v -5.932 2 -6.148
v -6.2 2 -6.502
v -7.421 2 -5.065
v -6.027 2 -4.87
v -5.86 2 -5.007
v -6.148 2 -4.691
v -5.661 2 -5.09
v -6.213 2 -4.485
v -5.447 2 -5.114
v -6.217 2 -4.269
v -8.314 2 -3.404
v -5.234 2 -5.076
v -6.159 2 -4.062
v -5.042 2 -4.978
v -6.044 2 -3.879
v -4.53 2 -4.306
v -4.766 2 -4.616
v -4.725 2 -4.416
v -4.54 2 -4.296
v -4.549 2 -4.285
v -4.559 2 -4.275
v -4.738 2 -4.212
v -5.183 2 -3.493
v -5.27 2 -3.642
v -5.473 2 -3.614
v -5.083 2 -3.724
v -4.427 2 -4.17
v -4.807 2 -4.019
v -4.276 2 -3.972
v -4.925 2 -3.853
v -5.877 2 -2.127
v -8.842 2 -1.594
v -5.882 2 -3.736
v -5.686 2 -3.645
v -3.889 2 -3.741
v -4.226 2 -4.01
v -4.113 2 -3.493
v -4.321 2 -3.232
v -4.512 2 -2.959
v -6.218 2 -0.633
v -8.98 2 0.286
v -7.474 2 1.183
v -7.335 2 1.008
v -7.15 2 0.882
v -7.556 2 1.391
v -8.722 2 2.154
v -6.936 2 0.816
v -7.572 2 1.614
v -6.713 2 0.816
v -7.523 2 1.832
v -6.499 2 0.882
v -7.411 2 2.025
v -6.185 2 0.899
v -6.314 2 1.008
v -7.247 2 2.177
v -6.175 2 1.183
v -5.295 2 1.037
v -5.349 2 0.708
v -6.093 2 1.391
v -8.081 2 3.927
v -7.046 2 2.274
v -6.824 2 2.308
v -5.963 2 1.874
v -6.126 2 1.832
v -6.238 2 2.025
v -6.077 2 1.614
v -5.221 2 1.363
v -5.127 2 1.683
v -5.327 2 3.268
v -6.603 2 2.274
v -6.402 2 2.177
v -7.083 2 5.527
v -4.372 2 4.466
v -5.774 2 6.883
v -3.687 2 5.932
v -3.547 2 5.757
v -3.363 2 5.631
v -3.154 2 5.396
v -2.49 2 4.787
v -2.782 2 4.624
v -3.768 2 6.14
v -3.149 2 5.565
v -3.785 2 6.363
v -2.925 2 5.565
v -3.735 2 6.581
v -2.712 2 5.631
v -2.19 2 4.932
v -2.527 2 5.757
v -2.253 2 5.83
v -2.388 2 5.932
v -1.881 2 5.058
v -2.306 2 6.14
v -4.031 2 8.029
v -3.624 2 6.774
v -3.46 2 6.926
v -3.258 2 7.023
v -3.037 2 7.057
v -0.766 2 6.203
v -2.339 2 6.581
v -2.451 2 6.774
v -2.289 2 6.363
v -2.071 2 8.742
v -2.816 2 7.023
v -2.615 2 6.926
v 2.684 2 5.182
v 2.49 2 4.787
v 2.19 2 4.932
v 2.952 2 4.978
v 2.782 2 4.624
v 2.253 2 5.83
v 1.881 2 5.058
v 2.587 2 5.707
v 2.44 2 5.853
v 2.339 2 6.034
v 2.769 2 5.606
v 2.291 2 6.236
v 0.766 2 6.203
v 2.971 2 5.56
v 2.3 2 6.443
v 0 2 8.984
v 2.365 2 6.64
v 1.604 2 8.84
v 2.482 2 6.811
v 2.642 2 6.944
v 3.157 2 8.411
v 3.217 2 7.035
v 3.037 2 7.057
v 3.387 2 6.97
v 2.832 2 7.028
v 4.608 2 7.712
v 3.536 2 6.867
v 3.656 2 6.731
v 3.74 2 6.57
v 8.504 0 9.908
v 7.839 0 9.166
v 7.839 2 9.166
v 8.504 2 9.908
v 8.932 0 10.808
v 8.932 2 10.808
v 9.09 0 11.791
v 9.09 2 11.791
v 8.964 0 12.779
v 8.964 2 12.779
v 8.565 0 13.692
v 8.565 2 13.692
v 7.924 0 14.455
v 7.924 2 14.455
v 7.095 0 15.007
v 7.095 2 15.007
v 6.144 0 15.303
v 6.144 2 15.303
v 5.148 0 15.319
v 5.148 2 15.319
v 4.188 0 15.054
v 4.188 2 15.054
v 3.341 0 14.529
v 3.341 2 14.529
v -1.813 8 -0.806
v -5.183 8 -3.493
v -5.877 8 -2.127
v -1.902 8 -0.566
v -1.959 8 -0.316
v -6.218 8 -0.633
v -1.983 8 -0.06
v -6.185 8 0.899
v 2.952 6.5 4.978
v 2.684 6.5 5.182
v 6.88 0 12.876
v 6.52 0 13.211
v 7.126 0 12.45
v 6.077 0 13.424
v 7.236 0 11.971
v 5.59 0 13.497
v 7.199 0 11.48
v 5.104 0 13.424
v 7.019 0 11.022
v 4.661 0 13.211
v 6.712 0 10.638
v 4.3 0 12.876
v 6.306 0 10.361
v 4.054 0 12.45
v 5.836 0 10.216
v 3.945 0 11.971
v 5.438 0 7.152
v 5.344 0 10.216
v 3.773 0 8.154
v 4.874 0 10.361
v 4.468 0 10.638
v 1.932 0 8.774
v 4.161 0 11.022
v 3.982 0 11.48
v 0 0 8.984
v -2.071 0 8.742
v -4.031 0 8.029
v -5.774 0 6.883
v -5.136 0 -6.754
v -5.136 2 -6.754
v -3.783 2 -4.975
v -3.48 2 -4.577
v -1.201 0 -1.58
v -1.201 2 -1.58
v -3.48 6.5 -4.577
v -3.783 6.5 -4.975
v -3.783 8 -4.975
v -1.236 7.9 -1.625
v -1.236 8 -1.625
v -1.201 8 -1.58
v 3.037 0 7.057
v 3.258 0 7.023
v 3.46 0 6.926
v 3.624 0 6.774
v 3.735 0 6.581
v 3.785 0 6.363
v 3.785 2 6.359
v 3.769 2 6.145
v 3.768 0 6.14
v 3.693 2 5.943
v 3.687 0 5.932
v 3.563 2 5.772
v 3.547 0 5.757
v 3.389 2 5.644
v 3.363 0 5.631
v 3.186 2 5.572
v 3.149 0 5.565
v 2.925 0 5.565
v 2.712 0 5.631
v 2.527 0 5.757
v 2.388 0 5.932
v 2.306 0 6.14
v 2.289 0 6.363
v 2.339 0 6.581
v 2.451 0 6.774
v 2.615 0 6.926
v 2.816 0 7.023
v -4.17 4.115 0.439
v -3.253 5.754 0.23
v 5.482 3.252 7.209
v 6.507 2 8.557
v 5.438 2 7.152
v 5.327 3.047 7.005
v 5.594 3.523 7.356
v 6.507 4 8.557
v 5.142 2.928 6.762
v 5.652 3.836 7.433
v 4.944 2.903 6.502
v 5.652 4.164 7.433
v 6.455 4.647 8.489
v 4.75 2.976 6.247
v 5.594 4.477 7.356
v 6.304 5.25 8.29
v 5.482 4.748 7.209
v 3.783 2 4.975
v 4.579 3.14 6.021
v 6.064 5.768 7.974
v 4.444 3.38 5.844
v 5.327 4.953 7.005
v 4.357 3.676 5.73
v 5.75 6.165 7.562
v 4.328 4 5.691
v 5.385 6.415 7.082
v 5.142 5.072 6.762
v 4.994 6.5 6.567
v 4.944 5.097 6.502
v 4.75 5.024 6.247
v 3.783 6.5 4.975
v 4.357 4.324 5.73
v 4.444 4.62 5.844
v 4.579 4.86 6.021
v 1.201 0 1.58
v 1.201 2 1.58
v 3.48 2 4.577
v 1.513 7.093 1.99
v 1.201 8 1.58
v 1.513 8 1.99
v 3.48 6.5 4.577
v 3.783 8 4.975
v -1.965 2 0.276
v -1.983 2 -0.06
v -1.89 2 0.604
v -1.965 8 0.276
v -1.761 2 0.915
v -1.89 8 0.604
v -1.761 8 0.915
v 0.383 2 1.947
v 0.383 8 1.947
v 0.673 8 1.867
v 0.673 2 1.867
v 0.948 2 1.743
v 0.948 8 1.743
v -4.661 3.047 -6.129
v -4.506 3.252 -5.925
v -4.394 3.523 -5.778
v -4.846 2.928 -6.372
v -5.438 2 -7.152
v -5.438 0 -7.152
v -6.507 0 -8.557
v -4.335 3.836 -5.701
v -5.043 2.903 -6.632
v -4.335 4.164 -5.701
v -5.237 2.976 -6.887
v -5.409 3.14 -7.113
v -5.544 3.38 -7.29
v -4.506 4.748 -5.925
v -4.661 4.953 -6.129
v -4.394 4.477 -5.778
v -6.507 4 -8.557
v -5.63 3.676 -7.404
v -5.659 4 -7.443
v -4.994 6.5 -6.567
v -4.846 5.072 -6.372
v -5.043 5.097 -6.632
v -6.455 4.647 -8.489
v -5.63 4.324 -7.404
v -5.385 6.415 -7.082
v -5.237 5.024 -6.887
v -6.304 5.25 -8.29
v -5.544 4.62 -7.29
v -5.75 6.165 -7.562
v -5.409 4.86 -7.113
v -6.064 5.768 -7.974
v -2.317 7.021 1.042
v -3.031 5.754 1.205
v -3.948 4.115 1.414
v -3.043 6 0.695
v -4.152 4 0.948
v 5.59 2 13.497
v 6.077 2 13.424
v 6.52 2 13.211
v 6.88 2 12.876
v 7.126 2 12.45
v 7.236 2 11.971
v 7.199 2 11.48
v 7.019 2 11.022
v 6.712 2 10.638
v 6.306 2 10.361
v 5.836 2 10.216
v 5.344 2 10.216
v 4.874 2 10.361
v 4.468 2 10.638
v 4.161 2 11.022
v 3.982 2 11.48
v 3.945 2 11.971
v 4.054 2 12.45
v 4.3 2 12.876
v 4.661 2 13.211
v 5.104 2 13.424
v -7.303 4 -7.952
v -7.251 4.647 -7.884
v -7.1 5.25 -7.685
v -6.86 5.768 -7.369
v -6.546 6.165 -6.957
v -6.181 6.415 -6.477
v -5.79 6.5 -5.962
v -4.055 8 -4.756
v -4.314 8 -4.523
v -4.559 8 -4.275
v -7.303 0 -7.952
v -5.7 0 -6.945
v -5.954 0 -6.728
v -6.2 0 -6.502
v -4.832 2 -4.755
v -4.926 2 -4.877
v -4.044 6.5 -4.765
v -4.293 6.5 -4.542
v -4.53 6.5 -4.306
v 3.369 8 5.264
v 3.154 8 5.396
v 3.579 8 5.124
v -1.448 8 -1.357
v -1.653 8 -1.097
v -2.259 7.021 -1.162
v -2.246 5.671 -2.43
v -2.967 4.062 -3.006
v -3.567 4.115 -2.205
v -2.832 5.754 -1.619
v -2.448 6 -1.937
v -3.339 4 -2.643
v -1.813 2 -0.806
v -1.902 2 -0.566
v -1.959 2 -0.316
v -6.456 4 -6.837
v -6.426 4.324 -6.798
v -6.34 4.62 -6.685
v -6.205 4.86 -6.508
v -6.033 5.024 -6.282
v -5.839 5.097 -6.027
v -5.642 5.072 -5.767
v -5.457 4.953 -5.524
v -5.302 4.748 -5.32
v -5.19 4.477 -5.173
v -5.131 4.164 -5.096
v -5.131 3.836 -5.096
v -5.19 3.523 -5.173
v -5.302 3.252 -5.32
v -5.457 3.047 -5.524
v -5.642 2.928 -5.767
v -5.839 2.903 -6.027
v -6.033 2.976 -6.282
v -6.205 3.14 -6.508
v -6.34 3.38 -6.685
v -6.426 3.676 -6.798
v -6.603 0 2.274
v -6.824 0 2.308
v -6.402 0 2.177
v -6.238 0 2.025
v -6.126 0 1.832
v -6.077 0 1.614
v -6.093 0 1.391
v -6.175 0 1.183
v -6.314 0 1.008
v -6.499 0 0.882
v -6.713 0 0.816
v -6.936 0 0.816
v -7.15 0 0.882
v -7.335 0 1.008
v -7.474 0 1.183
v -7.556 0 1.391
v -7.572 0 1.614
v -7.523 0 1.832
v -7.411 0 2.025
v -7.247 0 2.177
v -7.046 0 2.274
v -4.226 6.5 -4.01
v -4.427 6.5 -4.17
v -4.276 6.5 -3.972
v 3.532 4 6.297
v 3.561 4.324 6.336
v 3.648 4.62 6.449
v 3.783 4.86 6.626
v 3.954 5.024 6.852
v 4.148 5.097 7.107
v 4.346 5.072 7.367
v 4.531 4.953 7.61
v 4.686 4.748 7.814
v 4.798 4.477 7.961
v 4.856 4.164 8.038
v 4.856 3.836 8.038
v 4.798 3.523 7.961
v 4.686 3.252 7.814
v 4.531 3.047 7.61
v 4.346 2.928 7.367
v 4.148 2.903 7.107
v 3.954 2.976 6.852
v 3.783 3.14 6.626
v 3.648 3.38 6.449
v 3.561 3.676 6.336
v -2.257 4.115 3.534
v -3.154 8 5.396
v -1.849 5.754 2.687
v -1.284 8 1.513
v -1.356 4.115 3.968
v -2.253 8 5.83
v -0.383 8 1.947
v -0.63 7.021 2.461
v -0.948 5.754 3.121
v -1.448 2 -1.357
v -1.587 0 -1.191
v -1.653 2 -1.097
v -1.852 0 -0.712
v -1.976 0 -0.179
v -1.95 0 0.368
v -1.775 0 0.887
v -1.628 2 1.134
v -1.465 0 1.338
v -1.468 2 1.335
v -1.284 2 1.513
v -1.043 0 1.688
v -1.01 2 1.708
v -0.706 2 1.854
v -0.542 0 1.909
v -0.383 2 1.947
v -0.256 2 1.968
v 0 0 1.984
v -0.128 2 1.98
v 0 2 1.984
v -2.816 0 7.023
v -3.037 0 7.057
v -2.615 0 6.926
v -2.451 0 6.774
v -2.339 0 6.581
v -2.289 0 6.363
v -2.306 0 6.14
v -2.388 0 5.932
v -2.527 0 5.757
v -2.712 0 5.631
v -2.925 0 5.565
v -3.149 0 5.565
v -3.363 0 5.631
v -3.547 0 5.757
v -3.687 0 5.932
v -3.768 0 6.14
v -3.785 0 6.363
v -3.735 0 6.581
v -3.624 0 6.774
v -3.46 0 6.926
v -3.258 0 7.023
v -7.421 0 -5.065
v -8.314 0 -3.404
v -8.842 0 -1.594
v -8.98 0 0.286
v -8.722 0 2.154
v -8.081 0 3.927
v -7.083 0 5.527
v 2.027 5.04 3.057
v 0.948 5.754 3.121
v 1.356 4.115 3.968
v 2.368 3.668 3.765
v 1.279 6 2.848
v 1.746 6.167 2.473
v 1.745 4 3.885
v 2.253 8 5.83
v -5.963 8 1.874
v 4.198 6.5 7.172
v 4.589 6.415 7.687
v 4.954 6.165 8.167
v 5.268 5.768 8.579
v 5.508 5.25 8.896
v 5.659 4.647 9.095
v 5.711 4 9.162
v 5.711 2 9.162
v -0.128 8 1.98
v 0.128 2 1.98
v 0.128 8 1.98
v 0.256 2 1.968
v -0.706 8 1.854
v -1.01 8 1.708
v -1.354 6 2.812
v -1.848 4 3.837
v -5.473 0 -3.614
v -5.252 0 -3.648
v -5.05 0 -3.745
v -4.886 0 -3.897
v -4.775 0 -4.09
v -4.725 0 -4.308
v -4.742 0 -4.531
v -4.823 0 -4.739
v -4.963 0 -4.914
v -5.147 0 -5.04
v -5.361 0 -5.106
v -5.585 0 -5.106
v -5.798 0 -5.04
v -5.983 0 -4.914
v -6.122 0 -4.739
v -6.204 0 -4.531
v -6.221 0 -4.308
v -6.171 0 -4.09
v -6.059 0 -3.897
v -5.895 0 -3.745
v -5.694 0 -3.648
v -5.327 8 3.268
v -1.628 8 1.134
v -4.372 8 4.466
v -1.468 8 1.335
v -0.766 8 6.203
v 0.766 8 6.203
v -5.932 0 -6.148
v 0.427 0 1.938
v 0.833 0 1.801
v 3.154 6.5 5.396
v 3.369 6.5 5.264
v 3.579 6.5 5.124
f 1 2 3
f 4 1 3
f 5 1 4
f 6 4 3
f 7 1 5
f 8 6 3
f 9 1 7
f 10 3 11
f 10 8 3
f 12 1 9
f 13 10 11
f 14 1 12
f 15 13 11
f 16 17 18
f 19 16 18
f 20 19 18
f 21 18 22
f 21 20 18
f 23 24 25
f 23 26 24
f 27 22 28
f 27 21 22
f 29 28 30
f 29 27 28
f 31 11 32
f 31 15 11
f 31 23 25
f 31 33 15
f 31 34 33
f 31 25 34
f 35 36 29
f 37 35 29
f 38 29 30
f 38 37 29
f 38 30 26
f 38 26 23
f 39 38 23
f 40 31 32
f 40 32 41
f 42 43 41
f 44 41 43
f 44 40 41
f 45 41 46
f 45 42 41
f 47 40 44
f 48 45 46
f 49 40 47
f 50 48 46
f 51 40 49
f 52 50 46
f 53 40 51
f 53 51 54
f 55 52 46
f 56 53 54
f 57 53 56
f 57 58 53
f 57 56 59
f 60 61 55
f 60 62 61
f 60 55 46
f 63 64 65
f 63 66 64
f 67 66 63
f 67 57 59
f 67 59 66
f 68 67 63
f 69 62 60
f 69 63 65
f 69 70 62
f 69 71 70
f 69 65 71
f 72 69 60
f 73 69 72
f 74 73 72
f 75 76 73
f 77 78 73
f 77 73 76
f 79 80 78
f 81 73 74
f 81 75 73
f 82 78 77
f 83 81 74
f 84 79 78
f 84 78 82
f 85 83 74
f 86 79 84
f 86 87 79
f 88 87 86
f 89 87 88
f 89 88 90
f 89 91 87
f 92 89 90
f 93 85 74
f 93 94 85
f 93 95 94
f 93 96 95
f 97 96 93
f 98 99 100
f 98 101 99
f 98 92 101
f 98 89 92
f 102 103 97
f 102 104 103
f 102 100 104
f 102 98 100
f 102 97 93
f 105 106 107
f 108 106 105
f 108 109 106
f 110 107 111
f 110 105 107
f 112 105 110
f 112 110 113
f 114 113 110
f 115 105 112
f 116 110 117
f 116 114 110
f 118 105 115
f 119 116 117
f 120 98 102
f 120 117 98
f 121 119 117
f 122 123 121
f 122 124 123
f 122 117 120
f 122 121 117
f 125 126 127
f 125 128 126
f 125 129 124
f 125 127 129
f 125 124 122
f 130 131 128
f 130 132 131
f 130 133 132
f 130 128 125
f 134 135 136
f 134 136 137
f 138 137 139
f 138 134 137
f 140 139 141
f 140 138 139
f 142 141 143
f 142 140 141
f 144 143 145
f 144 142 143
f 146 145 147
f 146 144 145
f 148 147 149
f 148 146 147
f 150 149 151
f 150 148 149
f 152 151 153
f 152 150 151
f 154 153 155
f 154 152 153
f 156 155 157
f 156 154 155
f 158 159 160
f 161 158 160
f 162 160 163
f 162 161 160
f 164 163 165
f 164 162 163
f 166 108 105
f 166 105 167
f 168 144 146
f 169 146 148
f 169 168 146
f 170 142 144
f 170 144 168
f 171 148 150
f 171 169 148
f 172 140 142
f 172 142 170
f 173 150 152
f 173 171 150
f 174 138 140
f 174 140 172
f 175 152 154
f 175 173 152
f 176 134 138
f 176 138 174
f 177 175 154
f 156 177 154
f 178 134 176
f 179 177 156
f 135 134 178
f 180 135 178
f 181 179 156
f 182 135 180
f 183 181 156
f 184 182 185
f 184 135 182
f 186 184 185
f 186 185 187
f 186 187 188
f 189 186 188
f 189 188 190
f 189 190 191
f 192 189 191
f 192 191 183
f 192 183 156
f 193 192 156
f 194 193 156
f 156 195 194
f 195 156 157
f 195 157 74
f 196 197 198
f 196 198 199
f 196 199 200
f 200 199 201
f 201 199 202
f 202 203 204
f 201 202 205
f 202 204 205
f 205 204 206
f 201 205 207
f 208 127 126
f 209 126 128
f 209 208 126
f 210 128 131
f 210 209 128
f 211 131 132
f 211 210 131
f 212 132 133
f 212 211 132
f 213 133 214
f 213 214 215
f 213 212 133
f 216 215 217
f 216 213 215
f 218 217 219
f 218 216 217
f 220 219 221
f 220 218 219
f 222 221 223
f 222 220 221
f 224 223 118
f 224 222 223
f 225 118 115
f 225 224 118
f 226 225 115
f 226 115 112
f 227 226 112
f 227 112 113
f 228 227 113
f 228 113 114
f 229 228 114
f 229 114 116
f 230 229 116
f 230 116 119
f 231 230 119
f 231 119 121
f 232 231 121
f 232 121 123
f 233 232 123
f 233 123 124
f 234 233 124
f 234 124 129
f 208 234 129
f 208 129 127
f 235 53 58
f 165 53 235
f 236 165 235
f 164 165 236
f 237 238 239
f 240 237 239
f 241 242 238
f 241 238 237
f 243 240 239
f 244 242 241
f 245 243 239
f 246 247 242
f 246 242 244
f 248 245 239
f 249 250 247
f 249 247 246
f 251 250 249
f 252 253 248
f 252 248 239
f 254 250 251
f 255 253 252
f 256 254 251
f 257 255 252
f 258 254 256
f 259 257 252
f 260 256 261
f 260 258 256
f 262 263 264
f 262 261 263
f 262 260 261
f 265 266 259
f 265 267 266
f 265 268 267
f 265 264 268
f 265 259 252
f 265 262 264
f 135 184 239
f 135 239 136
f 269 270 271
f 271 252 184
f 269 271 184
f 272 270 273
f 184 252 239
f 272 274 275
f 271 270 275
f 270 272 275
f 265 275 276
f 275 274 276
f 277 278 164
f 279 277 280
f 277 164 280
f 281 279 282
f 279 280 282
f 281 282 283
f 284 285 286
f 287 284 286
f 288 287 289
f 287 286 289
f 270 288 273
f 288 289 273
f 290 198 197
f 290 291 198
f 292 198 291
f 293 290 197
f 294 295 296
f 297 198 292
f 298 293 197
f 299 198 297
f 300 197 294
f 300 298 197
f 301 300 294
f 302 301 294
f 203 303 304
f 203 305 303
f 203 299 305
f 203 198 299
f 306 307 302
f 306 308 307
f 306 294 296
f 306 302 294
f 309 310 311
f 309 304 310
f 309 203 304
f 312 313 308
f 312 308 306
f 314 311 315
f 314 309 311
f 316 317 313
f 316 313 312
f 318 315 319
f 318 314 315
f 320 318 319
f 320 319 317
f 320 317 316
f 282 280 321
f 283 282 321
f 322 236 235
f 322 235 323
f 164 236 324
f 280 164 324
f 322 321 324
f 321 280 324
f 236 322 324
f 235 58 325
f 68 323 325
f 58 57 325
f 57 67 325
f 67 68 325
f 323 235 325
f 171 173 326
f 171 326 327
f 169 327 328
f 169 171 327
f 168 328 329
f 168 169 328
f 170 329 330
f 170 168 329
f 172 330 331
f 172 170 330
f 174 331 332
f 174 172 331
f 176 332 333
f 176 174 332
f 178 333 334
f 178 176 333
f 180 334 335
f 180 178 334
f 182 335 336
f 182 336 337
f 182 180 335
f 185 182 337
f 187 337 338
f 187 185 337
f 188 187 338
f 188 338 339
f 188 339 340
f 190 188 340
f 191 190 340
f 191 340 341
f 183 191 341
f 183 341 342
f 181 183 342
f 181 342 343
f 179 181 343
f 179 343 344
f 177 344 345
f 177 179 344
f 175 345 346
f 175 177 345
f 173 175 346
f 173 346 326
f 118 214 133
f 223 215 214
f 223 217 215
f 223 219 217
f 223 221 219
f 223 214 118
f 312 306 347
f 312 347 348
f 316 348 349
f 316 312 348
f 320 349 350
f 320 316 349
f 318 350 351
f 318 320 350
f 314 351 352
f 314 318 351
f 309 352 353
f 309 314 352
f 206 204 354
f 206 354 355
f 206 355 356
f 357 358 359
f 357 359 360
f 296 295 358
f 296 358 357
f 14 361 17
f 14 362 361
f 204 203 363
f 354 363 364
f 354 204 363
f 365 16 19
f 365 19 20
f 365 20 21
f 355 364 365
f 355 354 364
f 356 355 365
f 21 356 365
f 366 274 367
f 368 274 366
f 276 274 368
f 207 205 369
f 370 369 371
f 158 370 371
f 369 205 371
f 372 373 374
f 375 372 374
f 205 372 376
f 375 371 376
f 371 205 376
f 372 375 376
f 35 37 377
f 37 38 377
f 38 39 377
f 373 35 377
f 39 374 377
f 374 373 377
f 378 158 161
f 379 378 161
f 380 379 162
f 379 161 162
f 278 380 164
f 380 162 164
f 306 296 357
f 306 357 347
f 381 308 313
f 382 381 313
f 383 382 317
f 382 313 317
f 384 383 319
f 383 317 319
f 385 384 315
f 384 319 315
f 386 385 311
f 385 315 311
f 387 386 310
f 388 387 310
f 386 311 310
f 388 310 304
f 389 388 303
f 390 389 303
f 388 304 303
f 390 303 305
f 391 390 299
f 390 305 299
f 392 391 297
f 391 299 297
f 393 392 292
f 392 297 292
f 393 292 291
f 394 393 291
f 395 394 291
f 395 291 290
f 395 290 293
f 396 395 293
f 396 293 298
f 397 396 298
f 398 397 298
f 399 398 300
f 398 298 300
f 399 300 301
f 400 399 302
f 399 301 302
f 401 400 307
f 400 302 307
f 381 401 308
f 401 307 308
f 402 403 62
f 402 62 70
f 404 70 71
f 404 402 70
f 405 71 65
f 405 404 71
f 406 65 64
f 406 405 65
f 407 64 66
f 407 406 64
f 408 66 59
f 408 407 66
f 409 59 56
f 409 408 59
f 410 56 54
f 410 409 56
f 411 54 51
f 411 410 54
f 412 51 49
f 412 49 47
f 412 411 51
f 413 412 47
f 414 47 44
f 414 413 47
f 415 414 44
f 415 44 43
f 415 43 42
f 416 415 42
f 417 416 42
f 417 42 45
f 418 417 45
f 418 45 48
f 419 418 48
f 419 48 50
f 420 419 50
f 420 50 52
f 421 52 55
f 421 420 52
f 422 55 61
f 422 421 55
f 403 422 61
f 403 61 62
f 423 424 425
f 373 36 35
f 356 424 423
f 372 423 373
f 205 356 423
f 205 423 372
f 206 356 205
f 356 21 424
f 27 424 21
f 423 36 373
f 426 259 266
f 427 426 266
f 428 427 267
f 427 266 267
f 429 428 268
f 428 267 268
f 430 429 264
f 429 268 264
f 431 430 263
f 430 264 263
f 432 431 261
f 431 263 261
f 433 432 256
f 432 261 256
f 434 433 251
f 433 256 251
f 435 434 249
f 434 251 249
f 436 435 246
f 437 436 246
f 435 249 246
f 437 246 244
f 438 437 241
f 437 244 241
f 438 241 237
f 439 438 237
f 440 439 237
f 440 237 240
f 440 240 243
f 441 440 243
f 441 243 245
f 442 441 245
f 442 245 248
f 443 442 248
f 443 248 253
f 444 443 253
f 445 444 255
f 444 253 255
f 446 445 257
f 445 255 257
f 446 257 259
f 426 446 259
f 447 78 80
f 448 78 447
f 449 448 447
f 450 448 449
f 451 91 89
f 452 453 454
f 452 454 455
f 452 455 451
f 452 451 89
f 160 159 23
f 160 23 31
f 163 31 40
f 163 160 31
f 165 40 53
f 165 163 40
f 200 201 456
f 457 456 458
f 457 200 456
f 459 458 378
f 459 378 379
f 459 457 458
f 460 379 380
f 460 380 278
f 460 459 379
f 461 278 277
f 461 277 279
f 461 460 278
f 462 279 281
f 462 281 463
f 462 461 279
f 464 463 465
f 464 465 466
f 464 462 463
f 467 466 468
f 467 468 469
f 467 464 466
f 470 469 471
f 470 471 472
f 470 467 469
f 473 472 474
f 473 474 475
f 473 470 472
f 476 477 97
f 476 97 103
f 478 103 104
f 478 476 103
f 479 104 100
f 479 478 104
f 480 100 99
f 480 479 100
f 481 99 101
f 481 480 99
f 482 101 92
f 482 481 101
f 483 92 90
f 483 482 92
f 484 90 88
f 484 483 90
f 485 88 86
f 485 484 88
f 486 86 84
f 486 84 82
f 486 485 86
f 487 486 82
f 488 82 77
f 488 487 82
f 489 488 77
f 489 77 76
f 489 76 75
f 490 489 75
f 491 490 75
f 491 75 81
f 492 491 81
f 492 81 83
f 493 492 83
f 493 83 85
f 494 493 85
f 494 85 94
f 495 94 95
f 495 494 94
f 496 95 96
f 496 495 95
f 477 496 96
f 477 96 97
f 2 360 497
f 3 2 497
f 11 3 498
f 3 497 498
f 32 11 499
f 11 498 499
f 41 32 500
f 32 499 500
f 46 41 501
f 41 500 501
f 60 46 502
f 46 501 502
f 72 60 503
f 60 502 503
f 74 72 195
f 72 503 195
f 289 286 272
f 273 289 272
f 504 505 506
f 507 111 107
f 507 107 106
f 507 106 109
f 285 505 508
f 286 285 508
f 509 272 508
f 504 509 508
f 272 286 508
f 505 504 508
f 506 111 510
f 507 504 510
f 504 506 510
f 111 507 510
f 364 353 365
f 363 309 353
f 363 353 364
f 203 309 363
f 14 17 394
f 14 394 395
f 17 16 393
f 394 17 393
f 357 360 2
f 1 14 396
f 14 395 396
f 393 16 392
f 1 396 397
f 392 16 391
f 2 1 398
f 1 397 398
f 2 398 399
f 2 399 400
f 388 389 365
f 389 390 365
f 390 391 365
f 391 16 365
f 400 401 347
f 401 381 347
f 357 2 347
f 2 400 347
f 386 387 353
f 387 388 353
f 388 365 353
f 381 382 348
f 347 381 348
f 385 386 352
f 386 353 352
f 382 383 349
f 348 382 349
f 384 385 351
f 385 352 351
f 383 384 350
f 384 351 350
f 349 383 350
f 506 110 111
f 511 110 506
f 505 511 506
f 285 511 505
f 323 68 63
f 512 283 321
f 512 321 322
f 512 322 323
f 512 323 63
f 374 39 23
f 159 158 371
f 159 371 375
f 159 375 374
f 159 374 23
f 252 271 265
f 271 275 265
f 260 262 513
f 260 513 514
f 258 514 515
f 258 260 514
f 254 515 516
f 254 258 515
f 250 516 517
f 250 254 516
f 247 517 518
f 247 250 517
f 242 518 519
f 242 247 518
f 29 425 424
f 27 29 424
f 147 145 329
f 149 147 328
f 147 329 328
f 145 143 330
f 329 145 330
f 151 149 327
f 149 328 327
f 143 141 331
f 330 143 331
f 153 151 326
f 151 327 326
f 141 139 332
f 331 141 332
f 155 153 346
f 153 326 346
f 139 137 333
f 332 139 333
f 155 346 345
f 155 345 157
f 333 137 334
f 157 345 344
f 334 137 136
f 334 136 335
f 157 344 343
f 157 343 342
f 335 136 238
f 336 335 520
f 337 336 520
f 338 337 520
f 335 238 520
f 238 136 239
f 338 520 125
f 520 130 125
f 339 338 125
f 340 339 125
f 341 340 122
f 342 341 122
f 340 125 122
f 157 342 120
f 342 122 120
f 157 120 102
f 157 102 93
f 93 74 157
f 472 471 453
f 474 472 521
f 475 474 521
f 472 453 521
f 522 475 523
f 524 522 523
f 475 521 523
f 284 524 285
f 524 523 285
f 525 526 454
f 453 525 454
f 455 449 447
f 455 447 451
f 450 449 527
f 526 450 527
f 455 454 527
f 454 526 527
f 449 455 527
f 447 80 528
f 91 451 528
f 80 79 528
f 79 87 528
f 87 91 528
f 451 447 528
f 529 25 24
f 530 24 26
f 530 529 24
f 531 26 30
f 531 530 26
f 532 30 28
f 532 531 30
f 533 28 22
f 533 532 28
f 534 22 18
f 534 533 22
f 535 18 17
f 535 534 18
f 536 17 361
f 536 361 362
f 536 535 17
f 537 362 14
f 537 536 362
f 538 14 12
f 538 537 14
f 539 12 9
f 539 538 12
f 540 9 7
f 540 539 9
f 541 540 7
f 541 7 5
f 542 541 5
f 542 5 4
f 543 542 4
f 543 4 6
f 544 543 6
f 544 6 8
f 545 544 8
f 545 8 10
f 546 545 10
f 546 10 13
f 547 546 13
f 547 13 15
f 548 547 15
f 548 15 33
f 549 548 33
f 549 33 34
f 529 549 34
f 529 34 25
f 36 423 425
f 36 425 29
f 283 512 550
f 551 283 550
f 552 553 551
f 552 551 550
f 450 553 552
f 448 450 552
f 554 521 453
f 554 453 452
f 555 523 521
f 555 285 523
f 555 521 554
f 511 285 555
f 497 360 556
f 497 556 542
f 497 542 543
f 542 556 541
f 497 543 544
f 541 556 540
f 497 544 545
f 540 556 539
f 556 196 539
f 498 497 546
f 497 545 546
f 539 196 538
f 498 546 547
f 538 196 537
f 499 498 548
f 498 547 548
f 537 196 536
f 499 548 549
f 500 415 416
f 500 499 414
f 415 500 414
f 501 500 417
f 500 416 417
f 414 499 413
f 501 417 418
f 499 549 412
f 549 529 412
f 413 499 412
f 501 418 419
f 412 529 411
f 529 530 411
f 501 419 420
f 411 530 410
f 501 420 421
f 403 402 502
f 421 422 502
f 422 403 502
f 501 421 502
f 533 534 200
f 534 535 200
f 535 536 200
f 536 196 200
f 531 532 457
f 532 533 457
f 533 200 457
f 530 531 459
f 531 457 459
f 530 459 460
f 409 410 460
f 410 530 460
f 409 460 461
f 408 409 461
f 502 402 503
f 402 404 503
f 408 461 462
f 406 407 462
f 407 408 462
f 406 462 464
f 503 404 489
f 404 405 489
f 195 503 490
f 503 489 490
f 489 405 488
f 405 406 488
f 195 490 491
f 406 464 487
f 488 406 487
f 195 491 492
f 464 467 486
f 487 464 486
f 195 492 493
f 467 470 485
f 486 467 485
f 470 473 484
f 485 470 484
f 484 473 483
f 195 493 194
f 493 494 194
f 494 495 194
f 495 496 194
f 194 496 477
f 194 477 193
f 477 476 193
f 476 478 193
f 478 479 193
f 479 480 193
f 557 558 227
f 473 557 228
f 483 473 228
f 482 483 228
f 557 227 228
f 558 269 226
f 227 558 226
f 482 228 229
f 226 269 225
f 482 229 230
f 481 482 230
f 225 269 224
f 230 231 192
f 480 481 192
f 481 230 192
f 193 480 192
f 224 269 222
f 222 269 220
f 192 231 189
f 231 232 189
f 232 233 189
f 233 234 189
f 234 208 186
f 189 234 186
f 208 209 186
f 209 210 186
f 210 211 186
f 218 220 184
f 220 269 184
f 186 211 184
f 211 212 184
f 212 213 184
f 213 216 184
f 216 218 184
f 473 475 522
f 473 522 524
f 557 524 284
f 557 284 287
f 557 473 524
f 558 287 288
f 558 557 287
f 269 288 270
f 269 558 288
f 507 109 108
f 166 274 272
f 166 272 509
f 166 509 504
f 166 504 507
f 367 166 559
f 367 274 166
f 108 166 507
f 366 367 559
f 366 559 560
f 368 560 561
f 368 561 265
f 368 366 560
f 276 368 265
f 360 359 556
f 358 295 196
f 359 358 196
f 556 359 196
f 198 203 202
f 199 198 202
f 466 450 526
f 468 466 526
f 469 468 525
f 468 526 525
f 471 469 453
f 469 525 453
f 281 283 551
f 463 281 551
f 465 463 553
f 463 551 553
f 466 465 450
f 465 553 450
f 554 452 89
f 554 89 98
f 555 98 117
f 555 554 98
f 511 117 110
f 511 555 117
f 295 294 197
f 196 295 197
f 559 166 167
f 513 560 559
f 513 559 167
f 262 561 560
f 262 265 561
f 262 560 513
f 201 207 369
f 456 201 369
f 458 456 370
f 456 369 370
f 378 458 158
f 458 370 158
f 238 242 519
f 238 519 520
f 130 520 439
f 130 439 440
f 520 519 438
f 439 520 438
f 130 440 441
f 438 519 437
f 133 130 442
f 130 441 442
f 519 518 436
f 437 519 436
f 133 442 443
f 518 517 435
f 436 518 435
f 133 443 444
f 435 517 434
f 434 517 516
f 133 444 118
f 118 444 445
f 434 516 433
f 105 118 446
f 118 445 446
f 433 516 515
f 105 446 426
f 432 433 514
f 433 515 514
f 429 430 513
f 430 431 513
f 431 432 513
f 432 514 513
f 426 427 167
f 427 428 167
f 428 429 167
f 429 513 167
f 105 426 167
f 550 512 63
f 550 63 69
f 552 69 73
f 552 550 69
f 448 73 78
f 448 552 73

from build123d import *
from build123d.topology import SkipClean

# Parameters (mm, degrees)
SKETCH1_R           = 8.984375
SKETCH1_R_2         = 1.984375
SKETCH1_R_3         = 0.75
BOSS_EXTRUDE1_DEPTH = 2
SKETCH6_W           = 17.96875
SKETCH6_H           = 8
CUT_EXTRUDE1_DEPTH  = 16.014592511
BOSS_EXTRUDE3_START = -2
SKETCH7_R           = 1.65
BOSS_EXTRUDE3_DEPTH = 2
SKETCH8_R           = 1.1
BOSS_EXTRUDE4_DEPTH = 1


with BuildPart() as part:
    # Sketch1 → Boss-Extrude1 (new body)
    with BuildSketch(Plane(origin=(0, 0, 0), x_dir=(1, 0, 0), z_dir=(0, 1, 0))):
        with Locations(Location((0, 0, 0), (0, 0, 270))):
            Circle(SKETCH1_R)
        with Locations(Location((0, 0, 0), (0, 0, 270))):
            Circle(SKETCH1_R_2, mode=Mode.SUBTRACT)
        with Locations(Location((0, 7, 0), (0, 0, 270))):
            Circle(SKETCH1_R_3, mode=Mode.SUBTRACT)
        with Locations(Location((5.472820377, 4.364428613, 0), (0, 0, 270))):
            Circle(SKETCH1_R_3, mode=Mode.SUBTRACT)
        with Locations(Location((6.824495385, -1.557646538, 0), (0, 0, 270))):
            Circle(SKETCH1_R_3, mode=Mode.SUBTRACT)
        with Locations(Location((3.037186174, -6.306782075, 0), (0, 0, 270))):
            Circle(SKETCH1_R_3, mode=Mode.SUBTRACT)
        with Locations(Location((-3.037186174, -6.306782075, 0), (0, 0, 270))):
            Circle(SKETCH1_R_3, mode=Mode.SUBTRACT)
        with Locations(Location((-6.824495385, -1.557646538, 0), (0, 0, 270))):
            Circle(SKETCH1_R_3, mode=Mode.SUBTRACT)
        with Locations(Location((-5.472820377, 4.364428613, 0), (0, 0, 270))):
            Circle(SKETCH1_R_3, mode=Mode.SUBTRACT)
    extrude(amount=BOSS_EXTRUDE1_DEPTH)

    # Sweep1: sweep along a path in Sketch3
    with SkipClean():  # the faces are left unmerged after this step: merging them gives an invalid solid
        with BuildLine(Plane(origin=(0, 0, 0), x_dir=(0, 0, -1), z_dir=(1, 0, 0))) as sweep1_path:
            Line((0, 2), (0, 8))
        # Sketch2 → Sweep1 (sweep)
        with BuildSketch(Plane(origin=(0, 2, 0), x_dir=(1, 0, 0), z_dir=(0, 1, 0))):
            with BuildLine():
                Line((-0.5, 6.229967897), (-0.5, 1.920350005))
                ThreePointArc((-0.5, 1.920350005), (-0.860988045, 1.787860097), (-1.18964519, 1.588234385))
                Line((-1.18964519, 1.588234385), (-4.559040136, 4.275237191))
                ThreePointArc((-4.559040136, 4.275237191), (-2.711773369, 5.631055424), (-0.5, 6.229967897))
            make_face()
            with BuildLine():
                Line((0.5, 6.229967897), (0.5, 1.920350005))
                ThreePointArc((0.5, 1.920350005), (0.860988045, 1.787860097), (1.18964519, 1.588234385))
                Line((1.18964519, 1.588234385), (4.559040136, 4.275237191))
                ThreePointArc((4.559040136, 4.275237191), (2.711773369, 5.631055424), (0.5, 6.229967897))
            make_face()
            with BuildLine():
                Line((5.182529938, 3.493405709), (1.813134992, 0.806402903))
                ThreePointArc((1.813134992, 0.806402903), (1.934622576, 0.441564978), (1.983463288, 0.06014588))
                Line((1.983463288, 0.06014588), (6.185030062, -0.898834319))
                ThreePointArc((6.185030062, -0.898834319), (6.093299451, 1.390755837), (5.182529938, 3.493405709))
            make_face()
            with BuildLine():
                Line((5.962509128, -1.873762231), (1.760942354, -0.914782033))
                ThreePointArc((1.760942354, -0.914782033), (1.551446848, -1.237237576), (1.283693074, -1.5132337))
                Line((1.283693074, -1.5132337), (3.1535662, -5.396065254))
                ThreePointArc((3.1535662, -5.396065254), (4.886446765, -3.896811262), (5.962509128, -1.873762231))
            make_face()
            with BuildLine():
                Line((2.252597332, -5.829948993), (0.382724207, -1.947117439))
                ThreePointArc((0.382724207, -1.947117439), (0, -1.984375), (-0.382724207, -1.947117439))
                Line((-0.382724207, -1.947117439), (-2.252597332, -5.829948993))
                ThreePointArc((-2.252597332, -5.829948993), (0, -6.25), (2.252597332, -5.829948993))
            make_face()
            with BuildLine():
                Line((-3.1535662, -5.396065254), (-1.283693074, -1.5132337))
                ThreePointArc((-1.283693074, -1.5132337), (-1.551446848, -1.237237576), (-1.760942354, -0.914782033))
                Line((-1.760942354, -0.914782033), (-5.962509128, -1.873762231))
                ThreePointArc((-5.962509128, -1.873762231), (-4.886446765, -3.896811262), (-3.1535662, -5.396065254))
            make_face()
            with BuildLine():
                Line((-6.185030062, -0.898834319), (-1.983463288, 0.06014588))
                ThreePointArc((-1.983463288, 0.06014588), (-1.934622576, 0.441564978), (-1.813134992, 0.806402903))
                Line((-1.813134992, 0.806402903), (-5.182529938, 3.493405709))
                ThreePointArc((-5.182529938, 3.493405709), (-6.093299451, 1.390755837), (-6.185030062, -0.898834319))
            make_face()
        sweep(path=sweep1_path.line)

    # Sketch4 → Revolve1 (revolve)
    with SkipClean():  # the faces are left unmerged after this step: merging them gives an invalid solid
        with BuildSketch(Plane(origin=(0, 0, 0), x_dir=(0, 0, -1), z_dir=(1, 0, 0)), mode=Mode.PRIVATE) as revolve1_sk:
            Polygon((-5.396065254, 2), (-1.984375, 2), (-1.984375, 8), align=None)
        revolve(revolve1_sk.sketch.rotate(Axis((0, 0, 0), (0, 1, 0)), 165.405971265), axis=Axis((0, 0, 0), (0, 1, 0)))

    # Sketch6 → Cut-Extrude1 (cut, through all)
    with SkipClean():  # the faces are left unmerged after this step: merging them gives an invalid solid
        with BuildSketch(Plane(origin=(0, 0, 0), x_dir=(0.6052939880428899, 0, 0.7960020025346255), z_dir=(-0.7960020025346255, 0, 0.6052939880428899))):
            with Locations((0, 4)):
                Rectangle(SKETCH6_W, SKETCH6_H)
        extrude(amount=-CUT_EXTRUDE1_DEPTH, mode=Mode.SUBTRACT)

    # Sketch7 → Boss-Extrude3 (add)
    with SkipClean():  # the faces are left unmerged after this step: merging them gives an invalid solid
        with BuildSketch(Plane(origin=(0, 2, 0), x_dir=(1, 0, 0), z_dir=(0, 1, 0)).offset(BOSS_EXTRUDE3_START)):
            with BuildLine():
                Line((5.438188174, -7.151580492), (7.839492164, -9.165791707))
                ThreePointArc((7.839492164, -9.165791707), (8.271761308, -14.096627679), (3.340925335, -14.528896823))
                Line((3.340925335, -14.528896823), (-5.773830193, -6.883449647))
                ThreePointArc((-5.773830193, -6.883449647), (-0.214796249, -8.981806985), (5.438188174, -7.151580492))
            make_face()
            with Locations(Location((5.59020875, -11.847344265, 0), (0, 0, 270))):
                Circle(SKETCH7_R, mode=Mode.SUBTRACT)
        extrude(amount=BOSS_EXTRUDE3_DEPTH)

    # Sketch8 → Boss-Extrude4 (add)
    # profile 1 of 2: a face of its own
    with SkipClean():  # the faces are left unmerged after this step: merging them gives an invalid solid
        with BuildSketch(Plane(origin=(0, 0, 0), x_dir=(-0.60529398804289, 0, -0.7960020025346255), z_dir=(0.7960020025346254, 0, -0.6052939880428899))):
            with BuildLine():
                ThreePointArc((-8.25, 6.5), (-10.017766953, 5.767766953), (-10.75, 4))
                Line((-10.75, 4), (-10.75, 2))
                Line((-10.75, 2), (-5.75, 2))
                Line((-5.75, 2), (-5.75, 6.5))
                Line((-5.75, 6.5), (-8.25, 6.5))
            make_face()
            with Locations((-8.25, 4)):
                Circle(SKETCH8_R, mode=Mode.SUBTRACT)
        # profile 2 of 2: a face of its own
        with BuildSketch(Plane(origin=(0, 0, 0), x_dir=(-0.60529398804289, 0, -0.7960020025346255), z_dir=(0.7960020025346254, 0, -0.6052939880428899))):
            with BuildLine():
                Line((5.75, 2), (8.484375, 2))
                Line((8.484375, 2), (8.484375, 0))
                Line((8.484375, 0), (10.75, 0))
                Line((10.75, 0), (10.75, 4))
                ThreePointArc((10.75, 4), (10.017766953, 5.767766953), (8.25, 6.5))
                Line((8.25, 6.5), (5.75, 6.5))
                Line((5.75, 6.5), (5.75, 2))
            make_face()
            with Locations((8.25, 4)):
                Circle(SKETCH8_R, mode=Mode.SUBTRACT)
        extrude(amount=-BOSS_EXTRUDE4_DEPTH)


solid = part.part
